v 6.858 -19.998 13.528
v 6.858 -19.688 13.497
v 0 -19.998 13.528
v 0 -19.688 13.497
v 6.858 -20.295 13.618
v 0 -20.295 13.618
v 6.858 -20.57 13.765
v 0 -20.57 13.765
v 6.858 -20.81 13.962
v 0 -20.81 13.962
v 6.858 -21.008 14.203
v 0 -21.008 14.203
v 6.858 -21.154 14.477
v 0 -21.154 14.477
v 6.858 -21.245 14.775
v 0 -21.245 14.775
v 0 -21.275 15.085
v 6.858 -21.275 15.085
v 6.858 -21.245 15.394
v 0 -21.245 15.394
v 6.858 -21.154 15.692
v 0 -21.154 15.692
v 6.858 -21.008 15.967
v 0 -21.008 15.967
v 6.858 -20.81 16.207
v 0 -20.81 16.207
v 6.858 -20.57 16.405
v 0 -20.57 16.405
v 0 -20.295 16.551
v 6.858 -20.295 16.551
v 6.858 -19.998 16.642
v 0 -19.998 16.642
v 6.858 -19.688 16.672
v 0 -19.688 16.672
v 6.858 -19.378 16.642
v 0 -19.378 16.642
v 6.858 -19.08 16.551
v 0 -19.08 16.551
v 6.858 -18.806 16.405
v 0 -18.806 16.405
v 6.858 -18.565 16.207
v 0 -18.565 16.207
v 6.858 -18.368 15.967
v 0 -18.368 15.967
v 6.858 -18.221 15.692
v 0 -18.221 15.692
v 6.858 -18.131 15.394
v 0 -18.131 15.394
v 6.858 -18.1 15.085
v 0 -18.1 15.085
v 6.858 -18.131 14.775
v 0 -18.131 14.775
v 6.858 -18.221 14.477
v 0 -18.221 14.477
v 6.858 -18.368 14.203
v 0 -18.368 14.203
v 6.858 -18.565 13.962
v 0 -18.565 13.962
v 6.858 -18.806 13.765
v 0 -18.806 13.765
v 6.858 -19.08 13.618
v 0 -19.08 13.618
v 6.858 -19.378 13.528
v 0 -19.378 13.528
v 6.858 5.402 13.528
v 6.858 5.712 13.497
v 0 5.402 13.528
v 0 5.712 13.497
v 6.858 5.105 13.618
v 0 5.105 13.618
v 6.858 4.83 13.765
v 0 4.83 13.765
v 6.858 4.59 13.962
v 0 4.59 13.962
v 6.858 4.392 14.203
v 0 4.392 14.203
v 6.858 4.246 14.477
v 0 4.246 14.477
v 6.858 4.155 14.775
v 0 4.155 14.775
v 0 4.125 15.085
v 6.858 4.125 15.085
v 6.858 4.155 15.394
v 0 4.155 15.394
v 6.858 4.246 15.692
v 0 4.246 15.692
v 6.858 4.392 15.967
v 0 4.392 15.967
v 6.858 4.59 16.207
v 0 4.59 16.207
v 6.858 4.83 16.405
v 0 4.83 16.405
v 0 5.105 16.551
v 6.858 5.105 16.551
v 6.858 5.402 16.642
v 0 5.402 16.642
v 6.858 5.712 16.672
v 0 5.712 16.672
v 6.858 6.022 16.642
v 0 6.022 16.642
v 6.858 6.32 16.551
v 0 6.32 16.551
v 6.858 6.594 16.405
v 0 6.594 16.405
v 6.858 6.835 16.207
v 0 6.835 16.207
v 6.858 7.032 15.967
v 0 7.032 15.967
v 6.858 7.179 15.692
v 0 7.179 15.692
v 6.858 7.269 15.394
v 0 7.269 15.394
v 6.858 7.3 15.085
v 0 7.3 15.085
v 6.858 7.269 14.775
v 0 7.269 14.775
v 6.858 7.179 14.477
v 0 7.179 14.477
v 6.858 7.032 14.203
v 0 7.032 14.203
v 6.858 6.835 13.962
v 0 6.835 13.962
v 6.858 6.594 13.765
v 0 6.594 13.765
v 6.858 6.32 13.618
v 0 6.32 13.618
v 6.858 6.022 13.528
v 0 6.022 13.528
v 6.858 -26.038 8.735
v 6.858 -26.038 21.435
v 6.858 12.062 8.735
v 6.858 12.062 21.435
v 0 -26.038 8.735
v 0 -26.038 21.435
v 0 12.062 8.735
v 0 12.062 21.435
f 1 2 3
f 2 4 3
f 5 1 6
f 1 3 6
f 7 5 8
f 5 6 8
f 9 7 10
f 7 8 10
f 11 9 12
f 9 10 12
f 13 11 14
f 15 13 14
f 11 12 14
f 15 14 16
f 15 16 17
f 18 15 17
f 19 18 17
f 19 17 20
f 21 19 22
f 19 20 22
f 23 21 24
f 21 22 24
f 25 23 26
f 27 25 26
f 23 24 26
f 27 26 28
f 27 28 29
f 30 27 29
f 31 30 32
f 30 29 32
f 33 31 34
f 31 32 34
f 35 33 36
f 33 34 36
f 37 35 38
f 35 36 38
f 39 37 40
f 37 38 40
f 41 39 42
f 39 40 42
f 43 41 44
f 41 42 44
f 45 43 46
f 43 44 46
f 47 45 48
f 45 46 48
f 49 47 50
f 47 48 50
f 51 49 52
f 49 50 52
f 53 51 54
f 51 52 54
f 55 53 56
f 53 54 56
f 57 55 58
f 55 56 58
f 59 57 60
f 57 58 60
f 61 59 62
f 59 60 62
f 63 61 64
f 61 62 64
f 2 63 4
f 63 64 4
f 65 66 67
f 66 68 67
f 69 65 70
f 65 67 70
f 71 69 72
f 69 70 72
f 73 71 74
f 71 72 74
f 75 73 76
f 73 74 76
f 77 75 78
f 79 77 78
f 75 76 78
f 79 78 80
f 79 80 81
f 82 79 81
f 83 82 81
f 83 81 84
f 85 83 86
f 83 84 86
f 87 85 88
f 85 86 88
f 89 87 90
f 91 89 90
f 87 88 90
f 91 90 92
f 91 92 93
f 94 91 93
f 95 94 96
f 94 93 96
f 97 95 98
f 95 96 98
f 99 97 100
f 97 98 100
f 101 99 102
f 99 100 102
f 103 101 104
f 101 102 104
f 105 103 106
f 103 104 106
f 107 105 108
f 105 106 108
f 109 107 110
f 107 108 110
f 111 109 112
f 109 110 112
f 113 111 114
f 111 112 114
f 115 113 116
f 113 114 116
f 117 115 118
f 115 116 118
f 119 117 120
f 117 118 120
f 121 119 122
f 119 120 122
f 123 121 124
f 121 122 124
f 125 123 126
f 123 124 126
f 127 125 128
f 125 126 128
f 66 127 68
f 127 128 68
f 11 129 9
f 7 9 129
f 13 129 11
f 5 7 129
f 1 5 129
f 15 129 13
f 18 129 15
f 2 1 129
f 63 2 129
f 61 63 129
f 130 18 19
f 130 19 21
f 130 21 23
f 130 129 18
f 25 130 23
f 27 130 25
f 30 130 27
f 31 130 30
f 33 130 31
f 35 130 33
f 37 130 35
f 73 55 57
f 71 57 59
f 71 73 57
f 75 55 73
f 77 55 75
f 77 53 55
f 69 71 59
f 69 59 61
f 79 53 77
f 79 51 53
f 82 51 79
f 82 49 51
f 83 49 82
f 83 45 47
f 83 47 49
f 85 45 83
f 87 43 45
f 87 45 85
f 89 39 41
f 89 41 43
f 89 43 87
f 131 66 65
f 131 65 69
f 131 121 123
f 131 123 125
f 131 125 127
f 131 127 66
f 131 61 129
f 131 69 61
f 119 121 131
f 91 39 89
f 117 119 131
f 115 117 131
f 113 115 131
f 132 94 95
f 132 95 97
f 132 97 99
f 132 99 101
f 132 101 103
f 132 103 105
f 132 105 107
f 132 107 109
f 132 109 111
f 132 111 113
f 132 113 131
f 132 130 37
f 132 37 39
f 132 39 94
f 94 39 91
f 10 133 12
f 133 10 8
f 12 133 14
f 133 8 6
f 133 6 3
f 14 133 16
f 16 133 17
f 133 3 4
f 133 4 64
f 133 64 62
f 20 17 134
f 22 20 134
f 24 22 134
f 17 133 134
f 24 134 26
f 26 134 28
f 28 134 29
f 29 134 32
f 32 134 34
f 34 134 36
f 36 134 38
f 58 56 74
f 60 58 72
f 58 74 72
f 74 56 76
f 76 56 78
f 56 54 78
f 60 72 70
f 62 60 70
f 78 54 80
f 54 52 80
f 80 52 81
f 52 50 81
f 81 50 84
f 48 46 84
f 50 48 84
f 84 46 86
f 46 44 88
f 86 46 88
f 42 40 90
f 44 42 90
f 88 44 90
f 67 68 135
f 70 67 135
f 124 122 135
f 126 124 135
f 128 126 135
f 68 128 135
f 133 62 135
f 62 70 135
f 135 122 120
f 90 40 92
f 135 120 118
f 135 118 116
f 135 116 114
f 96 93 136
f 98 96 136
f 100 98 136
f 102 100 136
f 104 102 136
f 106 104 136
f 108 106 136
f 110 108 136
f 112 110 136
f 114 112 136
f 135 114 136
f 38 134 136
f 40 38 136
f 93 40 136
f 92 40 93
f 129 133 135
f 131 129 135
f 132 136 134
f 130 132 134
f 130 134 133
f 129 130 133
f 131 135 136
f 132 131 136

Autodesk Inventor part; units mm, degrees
ref_plane "YZ Plane" through (0, 0, 0) normal (1, 0, 0) x (0, 1, 0)
ref_plane "XZ Plane" through (0, 0, 0) normal (0, 1, 0) x (-1, 0, 0)
ref_plane "XY Plane" through (0, 0, 0) normal (0, 0, 1) x (1, 0, 0)
sketch "Sketch1" plane through (0, 0, 0) normal (1, 0, 0) x (0, 1, 0)
  line L0 (12.0622, 21.4347) -> (-26.0378, 21.4347)
  line L1 (-26.0378, 21.4347) -> (-26.0378, 8.7347)
  line L2 (-26.0378, 8.7347) -> (12.0622, 8.7347)
  line L3 (12.0622, 8.7347) -> (12.0622, 21.4347)
  point P0 (0, 0)
  dimension "d0" = 12.7
  dimension "d1" = 38.1
extrude "Extrusion1" add sketch "Sketch1" along normal blind 6.858
sketch "Sketch2" plane through (6.858, 0, 0) normal (1, 0, 0) x (0, 0, -1)
  line L0 (-8.7347, -26.0378) -> (-8.7347, 12.0622) projected
  line L1 (-8.7347, 12.0622) -> (-21.4347, 12.0622) projected
  point P0 (0, 0)
  point P1 (-15.0847, 5.7122)
  point P2 (-15.0847, -19.6878)
  dimension "d4" = 6.35
  dimension "d5" = 6.35
  dimension "d6" = 31.75
  dimension "d7" = 6.35
hole "Hole1" at (6.858, 5.7122, 15.0847) at (6.858, -19.6878, 15.0847) direction (-1, 0, 0) diameter 3.175 end through all
properties part number "GripperSliderBlock"
